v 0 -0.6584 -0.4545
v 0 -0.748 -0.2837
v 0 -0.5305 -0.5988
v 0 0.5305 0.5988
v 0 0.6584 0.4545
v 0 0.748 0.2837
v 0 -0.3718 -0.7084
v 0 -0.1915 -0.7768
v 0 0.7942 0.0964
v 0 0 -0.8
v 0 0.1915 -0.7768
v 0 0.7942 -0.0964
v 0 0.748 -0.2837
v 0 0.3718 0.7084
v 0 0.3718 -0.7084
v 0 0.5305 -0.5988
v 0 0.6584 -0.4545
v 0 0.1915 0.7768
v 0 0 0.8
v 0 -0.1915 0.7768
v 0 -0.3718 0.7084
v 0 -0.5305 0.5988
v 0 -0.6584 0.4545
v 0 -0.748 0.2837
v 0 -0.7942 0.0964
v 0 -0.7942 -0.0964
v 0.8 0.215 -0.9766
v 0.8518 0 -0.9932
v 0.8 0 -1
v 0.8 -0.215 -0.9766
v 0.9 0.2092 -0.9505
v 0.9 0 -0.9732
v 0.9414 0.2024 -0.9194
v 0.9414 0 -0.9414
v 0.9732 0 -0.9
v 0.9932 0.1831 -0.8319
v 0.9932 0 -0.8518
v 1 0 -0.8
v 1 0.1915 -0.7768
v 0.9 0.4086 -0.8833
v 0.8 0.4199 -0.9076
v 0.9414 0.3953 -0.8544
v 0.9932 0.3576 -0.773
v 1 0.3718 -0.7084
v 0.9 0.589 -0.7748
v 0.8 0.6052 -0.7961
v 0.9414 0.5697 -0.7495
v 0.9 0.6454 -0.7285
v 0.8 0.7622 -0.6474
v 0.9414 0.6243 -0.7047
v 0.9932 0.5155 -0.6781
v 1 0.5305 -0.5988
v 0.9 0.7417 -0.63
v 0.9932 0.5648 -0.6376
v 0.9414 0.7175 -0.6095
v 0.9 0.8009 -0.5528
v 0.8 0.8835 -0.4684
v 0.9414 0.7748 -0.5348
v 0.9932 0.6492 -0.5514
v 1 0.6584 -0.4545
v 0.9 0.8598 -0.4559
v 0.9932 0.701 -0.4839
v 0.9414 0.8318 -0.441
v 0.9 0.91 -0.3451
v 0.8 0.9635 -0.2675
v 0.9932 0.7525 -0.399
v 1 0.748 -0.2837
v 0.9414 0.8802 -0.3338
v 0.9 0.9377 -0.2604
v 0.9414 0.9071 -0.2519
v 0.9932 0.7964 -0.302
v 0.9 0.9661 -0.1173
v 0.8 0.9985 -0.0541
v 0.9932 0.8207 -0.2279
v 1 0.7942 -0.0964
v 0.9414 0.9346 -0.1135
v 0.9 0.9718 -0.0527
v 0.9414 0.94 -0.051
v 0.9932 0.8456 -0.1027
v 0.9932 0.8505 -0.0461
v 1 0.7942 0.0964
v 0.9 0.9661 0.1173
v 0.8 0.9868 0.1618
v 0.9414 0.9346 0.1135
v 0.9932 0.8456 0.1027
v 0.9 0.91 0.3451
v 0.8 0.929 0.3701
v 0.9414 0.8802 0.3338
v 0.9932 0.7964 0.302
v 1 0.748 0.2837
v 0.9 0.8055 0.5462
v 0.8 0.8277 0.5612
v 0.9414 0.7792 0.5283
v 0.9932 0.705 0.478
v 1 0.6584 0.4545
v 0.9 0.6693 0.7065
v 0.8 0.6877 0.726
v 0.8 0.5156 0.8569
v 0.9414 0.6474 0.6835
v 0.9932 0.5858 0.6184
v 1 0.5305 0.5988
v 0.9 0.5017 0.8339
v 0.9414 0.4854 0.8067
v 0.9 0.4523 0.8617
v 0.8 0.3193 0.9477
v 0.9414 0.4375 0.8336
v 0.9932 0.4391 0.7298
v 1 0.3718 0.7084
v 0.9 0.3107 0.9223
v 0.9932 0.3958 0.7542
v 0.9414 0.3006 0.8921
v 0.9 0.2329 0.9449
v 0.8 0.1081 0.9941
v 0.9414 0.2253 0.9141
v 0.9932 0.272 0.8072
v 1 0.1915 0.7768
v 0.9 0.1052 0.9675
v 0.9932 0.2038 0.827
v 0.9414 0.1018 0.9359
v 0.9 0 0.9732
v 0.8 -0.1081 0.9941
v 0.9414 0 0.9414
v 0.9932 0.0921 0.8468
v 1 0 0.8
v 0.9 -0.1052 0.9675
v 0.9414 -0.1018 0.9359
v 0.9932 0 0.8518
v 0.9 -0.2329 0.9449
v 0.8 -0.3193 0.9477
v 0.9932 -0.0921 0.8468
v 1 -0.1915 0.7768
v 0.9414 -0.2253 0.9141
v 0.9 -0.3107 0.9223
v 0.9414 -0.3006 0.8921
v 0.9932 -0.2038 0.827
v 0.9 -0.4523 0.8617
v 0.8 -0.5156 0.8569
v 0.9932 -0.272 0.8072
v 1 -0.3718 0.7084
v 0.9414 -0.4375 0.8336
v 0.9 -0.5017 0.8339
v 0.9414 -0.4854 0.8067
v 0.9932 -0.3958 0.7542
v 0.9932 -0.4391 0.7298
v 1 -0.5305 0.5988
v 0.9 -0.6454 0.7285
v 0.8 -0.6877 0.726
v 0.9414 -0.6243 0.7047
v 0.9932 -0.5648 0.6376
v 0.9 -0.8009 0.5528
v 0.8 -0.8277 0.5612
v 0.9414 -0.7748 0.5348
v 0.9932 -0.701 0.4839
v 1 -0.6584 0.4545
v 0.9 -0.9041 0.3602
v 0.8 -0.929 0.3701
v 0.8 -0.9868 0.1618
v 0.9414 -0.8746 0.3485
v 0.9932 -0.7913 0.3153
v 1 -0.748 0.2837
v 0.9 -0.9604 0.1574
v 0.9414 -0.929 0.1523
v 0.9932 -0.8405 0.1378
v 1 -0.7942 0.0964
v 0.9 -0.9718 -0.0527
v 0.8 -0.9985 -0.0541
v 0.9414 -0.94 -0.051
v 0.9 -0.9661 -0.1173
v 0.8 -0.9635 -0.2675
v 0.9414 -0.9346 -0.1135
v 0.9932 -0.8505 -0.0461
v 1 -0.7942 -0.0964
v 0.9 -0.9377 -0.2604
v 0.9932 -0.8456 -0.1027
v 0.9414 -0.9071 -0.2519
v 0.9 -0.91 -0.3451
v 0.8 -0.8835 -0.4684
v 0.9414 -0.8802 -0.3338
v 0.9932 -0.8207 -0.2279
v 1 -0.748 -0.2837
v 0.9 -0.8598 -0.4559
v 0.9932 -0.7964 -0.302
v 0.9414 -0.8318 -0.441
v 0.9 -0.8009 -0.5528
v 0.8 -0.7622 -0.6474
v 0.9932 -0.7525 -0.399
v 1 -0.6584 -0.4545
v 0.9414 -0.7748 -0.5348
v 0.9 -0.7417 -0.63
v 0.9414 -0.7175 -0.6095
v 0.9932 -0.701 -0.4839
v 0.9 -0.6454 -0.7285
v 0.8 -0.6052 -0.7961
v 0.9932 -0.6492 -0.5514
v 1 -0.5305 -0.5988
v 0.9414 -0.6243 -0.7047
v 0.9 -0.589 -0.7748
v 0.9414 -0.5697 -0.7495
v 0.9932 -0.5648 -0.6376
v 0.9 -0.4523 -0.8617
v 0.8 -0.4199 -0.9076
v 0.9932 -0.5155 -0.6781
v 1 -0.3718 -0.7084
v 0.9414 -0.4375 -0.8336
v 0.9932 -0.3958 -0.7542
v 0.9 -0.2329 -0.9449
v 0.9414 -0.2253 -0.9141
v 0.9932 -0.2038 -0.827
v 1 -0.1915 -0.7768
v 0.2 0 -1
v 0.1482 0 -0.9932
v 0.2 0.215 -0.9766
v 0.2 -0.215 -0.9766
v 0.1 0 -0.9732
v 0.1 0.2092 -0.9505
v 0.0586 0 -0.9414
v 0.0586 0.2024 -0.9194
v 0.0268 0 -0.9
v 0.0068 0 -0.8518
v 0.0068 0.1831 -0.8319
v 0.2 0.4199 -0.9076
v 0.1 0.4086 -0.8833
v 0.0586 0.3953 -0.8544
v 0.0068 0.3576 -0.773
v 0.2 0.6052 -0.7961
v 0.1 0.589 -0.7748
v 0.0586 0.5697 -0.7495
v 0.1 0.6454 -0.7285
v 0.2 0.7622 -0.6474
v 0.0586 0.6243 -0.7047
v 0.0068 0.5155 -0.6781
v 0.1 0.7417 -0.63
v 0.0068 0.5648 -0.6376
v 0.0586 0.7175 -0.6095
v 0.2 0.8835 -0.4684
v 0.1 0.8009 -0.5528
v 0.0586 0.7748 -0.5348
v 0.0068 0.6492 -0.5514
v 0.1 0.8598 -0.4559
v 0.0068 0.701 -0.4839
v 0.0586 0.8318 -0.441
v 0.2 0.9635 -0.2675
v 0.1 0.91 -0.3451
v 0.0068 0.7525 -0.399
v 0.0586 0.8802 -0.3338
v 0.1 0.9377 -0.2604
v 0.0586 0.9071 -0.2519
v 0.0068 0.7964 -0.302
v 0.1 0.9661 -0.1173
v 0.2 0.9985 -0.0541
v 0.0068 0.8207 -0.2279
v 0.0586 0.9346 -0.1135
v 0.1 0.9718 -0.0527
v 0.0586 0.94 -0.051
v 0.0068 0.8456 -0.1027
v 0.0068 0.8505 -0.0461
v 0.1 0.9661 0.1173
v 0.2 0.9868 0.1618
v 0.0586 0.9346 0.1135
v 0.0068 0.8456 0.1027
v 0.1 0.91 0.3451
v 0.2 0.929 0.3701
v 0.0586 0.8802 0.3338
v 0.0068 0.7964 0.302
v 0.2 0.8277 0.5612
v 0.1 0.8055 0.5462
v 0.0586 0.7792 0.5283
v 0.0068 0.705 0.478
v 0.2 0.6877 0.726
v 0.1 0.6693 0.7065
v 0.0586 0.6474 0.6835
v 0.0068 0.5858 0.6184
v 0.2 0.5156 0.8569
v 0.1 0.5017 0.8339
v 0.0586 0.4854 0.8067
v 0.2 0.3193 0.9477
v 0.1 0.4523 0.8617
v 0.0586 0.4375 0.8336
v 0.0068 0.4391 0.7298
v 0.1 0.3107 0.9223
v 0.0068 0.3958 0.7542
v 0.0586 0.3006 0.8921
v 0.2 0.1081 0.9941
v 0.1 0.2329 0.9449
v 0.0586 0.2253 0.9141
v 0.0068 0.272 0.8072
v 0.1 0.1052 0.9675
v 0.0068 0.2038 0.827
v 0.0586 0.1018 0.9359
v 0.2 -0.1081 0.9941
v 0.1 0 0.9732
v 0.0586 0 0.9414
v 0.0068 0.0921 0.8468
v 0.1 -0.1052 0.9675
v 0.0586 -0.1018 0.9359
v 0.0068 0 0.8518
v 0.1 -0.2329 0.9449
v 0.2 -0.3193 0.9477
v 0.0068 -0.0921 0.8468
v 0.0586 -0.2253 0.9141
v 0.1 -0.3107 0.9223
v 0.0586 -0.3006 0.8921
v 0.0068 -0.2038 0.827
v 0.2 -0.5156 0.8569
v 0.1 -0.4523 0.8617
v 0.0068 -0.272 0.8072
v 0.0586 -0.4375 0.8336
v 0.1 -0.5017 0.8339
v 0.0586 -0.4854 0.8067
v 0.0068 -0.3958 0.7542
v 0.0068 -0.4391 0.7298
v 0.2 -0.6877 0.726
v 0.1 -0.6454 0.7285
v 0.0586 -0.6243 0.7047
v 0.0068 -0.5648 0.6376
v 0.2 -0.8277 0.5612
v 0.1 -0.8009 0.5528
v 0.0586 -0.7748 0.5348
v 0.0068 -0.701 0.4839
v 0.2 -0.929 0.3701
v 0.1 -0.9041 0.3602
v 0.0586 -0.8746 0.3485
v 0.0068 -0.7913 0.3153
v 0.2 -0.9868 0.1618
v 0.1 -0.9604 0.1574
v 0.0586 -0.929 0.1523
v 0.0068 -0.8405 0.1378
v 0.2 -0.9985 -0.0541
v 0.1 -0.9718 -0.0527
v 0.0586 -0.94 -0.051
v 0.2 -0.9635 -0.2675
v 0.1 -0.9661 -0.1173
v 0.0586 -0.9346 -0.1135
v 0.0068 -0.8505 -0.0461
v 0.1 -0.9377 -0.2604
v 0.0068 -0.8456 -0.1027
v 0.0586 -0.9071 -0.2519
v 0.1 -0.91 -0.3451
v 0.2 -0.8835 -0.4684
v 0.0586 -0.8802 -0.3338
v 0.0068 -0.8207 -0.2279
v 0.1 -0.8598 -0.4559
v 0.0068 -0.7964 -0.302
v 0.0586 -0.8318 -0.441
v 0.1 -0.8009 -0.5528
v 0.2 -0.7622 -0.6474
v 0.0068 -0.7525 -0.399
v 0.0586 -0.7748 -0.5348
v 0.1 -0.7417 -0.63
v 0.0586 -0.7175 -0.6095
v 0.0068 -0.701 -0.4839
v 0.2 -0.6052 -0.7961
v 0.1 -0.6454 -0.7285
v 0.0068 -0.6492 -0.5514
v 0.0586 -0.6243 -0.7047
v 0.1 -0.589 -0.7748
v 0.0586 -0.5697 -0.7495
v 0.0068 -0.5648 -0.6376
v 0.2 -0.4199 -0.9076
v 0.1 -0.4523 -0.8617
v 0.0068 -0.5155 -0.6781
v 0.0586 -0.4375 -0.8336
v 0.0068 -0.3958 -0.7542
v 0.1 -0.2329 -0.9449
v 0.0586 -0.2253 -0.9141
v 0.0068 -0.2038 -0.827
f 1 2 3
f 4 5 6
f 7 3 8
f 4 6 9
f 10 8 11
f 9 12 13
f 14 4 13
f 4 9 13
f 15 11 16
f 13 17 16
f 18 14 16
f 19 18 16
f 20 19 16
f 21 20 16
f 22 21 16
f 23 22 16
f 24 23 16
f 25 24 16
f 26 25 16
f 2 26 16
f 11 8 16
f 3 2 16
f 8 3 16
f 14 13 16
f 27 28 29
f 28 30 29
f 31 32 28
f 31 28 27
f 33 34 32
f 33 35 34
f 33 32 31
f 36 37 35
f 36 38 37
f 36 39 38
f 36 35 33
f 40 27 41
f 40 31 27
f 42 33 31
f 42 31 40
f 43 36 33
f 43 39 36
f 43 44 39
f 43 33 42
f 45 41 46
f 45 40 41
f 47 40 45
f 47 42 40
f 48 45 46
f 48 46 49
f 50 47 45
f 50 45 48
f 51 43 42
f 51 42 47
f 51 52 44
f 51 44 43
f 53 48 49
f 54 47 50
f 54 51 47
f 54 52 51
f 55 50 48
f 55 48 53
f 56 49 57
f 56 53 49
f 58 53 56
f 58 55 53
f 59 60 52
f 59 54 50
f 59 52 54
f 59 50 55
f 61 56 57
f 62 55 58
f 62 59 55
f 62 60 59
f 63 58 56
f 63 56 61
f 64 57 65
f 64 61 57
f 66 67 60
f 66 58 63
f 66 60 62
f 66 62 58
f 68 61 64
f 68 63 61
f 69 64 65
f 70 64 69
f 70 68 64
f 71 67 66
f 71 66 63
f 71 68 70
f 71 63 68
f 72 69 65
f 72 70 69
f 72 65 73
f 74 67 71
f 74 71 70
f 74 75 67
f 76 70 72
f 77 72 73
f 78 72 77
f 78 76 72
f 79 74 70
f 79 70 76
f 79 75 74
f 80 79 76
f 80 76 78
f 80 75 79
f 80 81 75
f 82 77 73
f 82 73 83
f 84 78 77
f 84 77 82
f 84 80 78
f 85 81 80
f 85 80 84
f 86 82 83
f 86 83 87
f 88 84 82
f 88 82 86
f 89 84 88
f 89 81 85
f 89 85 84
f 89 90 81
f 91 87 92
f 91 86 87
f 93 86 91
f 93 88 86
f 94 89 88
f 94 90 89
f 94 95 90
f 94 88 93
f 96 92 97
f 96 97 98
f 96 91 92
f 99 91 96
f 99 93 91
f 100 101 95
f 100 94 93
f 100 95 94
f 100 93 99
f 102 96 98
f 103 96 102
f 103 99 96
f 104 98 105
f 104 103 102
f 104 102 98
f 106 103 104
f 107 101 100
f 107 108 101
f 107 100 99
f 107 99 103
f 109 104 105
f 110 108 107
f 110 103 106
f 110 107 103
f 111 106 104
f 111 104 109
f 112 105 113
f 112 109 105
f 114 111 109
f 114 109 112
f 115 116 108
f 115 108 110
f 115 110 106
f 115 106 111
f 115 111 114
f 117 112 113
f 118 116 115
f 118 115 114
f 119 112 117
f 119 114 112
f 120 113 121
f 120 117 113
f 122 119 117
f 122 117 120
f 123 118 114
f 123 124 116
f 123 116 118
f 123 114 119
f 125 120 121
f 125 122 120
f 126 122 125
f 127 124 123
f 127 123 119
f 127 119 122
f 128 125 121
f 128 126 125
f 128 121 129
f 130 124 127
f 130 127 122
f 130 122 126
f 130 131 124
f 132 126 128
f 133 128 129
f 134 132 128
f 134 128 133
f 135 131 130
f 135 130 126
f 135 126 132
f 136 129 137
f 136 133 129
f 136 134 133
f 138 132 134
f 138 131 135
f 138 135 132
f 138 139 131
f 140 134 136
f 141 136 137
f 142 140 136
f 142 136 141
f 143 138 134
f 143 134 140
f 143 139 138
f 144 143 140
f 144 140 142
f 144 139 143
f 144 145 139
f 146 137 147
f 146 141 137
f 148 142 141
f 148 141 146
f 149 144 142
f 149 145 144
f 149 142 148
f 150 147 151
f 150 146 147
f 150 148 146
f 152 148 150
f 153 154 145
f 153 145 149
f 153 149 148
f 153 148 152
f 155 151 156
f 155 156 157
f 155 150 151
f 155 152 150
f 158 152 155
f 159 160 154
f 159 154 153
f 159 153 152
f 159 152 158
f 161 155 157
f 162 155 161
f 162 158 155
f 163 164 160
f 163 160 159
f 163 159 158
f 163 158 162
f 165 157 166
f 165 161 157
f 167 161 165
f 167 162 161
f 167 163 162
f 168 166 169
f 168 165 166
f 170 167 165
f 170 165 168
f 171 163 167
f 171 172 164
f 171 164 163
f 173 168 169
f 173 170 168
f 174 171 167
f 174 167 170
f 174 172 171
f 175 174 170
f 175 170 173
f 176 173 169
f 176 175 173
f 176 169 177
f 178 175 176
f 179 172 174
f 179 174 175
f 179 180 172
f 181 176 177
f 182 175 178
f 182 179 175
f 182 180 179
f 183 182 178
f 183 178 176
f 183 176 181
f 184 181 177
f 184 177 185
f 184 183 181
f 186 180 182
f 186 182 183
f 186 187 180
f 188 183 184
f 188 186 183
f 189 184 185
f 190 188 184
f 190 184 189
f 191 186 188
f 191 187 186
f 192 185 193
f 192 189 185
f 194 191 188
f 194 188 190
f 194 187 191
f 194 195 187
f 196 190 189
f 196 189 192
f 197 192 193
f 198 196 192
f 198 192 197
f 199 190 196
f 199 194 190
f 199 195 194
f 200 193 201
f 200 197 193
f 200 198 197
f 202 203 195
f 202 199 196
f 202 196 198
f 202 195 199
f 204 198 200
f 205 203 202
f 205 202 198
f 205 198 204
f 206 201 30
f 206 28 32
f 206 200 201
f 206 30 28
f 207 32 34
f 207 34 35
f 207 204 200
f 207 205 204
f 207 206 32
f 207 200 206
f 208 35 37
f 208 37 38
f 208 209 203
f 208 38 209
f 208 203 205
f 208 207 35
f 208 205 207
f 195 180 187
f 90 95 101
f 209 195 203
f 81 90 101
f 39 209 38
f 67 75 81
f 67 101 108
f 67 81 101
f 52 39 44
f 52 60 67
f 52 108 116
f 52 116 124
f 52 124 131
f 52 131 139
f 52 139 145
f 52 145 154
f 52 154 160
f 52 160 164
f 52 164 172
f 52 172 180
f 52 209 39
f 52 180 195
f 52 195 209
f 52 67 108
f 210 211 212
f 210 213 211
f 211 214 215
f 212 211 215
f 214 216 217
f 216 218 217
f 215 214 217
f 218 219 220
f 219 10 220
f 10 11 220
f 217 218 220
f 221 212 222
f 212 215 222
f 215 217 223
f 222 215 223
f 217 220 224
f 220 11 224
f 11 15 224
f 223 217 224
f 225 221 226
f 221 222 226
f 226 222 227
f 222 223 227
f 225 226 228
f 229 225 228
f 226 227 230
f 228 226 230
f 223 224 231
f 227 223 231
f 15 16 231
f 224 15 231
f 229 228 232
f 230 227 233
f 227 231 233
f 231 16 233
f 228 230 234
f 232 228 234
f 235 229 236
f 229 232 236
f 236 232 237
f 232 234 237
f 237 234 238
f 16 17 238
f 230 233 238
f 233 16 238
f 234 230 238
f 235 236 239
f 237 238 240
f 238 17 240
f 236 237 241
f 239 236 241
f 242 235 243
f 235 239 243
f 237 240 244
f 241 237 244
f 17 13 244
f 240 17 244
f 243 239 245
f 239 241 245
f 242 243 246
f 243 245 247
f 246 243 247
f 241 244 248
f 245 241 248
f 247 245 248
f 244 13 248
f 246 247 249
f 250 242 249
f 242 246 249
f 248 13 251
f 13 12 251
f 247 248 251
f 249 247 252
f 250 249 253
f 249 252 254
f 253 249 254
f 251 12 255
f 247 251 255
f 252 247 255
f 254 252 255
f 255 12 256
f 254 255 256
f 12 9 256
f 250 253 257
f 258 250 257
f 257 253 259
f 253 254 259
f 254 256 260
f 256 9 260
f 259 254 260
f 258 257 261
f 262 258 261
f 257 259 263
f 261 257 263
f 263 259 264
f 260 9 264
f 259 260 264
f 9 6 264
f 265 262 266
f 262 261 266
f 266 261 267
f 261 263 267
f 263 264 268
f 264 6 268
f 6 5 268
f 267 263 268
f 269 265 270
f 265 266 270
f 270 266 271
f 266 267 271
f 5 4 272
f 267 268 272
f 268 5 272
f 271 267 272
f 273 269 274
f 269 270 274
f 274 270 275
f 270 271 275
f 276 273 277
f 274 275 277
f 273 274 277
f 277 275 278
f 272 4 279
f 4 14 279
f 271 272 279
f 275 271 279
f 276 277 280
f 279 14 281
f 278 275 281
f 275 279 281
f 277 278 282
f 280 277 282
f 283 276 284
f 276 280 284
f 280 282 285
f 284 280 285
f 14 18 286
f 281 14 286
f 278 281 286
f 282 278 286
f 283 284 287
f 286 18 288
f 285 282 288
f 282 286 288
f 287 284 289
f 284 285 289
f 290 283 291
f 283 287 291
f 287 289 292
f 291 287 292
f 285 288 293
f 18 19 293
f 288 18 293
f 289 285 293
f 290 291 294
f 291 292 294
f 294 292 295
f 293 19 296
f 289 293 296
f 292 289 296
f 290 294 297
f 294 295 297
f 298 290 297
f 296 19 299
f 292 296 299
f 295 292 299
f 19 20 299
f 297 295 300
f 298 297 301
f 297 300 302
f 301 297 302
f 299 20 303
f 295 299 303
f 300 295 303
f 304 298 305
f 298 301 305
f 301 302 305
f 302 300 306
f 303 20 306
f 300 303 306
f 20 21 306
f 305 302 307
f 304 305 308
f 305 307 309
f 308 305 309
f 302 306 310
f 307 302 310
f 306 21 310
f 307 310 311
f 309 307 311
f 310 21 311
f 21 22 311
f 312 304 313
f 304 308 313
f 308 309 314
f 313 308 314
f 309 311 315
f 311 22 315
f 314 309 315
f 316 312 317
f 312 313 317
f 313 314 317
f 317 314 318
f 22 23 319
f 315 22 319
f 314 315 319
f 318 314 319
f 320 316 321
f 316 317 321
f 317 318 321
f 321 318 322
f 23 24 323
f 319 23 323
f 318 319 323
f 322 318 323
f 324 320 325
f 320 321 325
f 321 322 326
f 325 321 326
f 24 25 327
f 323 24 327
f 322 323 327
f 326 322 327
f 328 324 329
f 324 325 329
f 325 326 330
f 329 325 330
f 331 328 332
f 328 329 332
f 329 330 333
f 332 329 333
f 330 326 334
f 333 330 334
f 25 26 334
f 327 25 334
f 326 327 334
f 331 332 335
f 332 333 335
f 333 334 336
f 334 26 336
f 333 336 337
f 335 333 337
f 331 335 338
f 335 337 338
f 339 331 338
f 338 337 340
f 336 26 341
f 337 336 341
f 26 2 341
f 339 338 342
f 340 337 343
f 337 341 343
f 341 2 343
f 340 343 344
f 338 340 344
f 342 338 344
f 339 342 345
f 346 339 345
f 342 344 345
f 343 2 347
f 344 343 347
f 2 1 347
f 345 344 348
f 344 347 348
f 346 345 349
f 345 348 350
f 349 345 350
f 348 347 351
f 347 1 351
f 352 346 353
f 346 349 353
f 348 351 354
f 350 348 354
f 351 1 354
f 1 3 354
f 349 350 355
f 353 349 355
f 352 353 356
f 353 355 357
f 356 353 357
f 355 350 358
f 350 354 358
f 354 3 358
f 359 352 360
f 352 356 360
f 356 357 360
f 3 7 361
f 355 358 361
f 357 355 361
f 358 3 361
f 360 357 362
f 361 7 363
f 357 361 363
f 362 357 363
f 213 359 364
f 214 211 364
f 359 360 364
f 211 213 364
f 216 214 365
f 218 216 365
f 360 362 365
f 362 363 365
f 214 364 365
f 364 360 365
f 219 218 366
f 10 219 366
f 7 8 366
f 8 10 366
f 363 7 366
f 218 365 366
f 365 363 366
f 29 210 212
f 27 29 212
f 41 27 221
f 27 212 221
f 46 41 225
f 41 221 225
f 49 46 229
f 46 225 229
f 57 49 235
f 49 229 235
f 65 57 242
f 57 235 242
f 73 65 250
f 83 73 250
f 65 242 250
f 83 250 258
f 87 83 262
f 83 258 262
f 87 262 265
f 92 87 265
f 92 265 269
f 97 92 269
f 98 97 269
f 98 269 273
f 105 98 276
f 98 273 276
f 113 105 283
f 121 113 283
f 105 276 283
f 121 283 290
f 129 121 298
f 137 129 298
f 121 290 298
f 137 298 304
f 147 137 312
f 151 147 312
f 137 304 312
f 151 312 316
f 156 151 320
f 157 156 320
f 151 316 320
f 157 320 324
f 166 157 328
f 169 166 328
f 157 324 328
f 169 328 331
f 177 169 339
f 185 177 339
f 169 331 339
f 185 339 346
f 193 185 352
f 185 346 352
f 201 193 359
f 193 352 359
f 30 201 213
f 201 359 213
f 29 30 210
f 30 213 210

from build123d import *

# Parameters (mm, degrees)
CYLINDER_R           = 1
CYLINDER_DEPTH       = 1
CYLINDER_PITCH_ANGLE = 90
FILLET_R             = 0.2


with BuildPart() as part:
    # Cylinder → Cylinder (new body)
    with BuildSketch(Plane.XY):
        Circle(CYLINDER_R)
    extrude(amount=CYLINDER_DEPTH)


with BuildPart() as part_1:
    # Cylinder pitch: moved
    add(part.part.rotate(Axis((0, 0, 0), (0, 1, 0)), CYLINDER_PITCH_ANGLE))


with BuildPart() as part_2:
    # Cylinder placement: moved
    add(part_1.part)

    # Fillet
    fillet_edges = [part_2.edges().sort_by_distance(p)[0] for p in [
        (1, 0, 1),
        (0, 0, 1),
    ]]
    fillet(fillet_edges, radius=FILLET_R)


solid = part_2.part
